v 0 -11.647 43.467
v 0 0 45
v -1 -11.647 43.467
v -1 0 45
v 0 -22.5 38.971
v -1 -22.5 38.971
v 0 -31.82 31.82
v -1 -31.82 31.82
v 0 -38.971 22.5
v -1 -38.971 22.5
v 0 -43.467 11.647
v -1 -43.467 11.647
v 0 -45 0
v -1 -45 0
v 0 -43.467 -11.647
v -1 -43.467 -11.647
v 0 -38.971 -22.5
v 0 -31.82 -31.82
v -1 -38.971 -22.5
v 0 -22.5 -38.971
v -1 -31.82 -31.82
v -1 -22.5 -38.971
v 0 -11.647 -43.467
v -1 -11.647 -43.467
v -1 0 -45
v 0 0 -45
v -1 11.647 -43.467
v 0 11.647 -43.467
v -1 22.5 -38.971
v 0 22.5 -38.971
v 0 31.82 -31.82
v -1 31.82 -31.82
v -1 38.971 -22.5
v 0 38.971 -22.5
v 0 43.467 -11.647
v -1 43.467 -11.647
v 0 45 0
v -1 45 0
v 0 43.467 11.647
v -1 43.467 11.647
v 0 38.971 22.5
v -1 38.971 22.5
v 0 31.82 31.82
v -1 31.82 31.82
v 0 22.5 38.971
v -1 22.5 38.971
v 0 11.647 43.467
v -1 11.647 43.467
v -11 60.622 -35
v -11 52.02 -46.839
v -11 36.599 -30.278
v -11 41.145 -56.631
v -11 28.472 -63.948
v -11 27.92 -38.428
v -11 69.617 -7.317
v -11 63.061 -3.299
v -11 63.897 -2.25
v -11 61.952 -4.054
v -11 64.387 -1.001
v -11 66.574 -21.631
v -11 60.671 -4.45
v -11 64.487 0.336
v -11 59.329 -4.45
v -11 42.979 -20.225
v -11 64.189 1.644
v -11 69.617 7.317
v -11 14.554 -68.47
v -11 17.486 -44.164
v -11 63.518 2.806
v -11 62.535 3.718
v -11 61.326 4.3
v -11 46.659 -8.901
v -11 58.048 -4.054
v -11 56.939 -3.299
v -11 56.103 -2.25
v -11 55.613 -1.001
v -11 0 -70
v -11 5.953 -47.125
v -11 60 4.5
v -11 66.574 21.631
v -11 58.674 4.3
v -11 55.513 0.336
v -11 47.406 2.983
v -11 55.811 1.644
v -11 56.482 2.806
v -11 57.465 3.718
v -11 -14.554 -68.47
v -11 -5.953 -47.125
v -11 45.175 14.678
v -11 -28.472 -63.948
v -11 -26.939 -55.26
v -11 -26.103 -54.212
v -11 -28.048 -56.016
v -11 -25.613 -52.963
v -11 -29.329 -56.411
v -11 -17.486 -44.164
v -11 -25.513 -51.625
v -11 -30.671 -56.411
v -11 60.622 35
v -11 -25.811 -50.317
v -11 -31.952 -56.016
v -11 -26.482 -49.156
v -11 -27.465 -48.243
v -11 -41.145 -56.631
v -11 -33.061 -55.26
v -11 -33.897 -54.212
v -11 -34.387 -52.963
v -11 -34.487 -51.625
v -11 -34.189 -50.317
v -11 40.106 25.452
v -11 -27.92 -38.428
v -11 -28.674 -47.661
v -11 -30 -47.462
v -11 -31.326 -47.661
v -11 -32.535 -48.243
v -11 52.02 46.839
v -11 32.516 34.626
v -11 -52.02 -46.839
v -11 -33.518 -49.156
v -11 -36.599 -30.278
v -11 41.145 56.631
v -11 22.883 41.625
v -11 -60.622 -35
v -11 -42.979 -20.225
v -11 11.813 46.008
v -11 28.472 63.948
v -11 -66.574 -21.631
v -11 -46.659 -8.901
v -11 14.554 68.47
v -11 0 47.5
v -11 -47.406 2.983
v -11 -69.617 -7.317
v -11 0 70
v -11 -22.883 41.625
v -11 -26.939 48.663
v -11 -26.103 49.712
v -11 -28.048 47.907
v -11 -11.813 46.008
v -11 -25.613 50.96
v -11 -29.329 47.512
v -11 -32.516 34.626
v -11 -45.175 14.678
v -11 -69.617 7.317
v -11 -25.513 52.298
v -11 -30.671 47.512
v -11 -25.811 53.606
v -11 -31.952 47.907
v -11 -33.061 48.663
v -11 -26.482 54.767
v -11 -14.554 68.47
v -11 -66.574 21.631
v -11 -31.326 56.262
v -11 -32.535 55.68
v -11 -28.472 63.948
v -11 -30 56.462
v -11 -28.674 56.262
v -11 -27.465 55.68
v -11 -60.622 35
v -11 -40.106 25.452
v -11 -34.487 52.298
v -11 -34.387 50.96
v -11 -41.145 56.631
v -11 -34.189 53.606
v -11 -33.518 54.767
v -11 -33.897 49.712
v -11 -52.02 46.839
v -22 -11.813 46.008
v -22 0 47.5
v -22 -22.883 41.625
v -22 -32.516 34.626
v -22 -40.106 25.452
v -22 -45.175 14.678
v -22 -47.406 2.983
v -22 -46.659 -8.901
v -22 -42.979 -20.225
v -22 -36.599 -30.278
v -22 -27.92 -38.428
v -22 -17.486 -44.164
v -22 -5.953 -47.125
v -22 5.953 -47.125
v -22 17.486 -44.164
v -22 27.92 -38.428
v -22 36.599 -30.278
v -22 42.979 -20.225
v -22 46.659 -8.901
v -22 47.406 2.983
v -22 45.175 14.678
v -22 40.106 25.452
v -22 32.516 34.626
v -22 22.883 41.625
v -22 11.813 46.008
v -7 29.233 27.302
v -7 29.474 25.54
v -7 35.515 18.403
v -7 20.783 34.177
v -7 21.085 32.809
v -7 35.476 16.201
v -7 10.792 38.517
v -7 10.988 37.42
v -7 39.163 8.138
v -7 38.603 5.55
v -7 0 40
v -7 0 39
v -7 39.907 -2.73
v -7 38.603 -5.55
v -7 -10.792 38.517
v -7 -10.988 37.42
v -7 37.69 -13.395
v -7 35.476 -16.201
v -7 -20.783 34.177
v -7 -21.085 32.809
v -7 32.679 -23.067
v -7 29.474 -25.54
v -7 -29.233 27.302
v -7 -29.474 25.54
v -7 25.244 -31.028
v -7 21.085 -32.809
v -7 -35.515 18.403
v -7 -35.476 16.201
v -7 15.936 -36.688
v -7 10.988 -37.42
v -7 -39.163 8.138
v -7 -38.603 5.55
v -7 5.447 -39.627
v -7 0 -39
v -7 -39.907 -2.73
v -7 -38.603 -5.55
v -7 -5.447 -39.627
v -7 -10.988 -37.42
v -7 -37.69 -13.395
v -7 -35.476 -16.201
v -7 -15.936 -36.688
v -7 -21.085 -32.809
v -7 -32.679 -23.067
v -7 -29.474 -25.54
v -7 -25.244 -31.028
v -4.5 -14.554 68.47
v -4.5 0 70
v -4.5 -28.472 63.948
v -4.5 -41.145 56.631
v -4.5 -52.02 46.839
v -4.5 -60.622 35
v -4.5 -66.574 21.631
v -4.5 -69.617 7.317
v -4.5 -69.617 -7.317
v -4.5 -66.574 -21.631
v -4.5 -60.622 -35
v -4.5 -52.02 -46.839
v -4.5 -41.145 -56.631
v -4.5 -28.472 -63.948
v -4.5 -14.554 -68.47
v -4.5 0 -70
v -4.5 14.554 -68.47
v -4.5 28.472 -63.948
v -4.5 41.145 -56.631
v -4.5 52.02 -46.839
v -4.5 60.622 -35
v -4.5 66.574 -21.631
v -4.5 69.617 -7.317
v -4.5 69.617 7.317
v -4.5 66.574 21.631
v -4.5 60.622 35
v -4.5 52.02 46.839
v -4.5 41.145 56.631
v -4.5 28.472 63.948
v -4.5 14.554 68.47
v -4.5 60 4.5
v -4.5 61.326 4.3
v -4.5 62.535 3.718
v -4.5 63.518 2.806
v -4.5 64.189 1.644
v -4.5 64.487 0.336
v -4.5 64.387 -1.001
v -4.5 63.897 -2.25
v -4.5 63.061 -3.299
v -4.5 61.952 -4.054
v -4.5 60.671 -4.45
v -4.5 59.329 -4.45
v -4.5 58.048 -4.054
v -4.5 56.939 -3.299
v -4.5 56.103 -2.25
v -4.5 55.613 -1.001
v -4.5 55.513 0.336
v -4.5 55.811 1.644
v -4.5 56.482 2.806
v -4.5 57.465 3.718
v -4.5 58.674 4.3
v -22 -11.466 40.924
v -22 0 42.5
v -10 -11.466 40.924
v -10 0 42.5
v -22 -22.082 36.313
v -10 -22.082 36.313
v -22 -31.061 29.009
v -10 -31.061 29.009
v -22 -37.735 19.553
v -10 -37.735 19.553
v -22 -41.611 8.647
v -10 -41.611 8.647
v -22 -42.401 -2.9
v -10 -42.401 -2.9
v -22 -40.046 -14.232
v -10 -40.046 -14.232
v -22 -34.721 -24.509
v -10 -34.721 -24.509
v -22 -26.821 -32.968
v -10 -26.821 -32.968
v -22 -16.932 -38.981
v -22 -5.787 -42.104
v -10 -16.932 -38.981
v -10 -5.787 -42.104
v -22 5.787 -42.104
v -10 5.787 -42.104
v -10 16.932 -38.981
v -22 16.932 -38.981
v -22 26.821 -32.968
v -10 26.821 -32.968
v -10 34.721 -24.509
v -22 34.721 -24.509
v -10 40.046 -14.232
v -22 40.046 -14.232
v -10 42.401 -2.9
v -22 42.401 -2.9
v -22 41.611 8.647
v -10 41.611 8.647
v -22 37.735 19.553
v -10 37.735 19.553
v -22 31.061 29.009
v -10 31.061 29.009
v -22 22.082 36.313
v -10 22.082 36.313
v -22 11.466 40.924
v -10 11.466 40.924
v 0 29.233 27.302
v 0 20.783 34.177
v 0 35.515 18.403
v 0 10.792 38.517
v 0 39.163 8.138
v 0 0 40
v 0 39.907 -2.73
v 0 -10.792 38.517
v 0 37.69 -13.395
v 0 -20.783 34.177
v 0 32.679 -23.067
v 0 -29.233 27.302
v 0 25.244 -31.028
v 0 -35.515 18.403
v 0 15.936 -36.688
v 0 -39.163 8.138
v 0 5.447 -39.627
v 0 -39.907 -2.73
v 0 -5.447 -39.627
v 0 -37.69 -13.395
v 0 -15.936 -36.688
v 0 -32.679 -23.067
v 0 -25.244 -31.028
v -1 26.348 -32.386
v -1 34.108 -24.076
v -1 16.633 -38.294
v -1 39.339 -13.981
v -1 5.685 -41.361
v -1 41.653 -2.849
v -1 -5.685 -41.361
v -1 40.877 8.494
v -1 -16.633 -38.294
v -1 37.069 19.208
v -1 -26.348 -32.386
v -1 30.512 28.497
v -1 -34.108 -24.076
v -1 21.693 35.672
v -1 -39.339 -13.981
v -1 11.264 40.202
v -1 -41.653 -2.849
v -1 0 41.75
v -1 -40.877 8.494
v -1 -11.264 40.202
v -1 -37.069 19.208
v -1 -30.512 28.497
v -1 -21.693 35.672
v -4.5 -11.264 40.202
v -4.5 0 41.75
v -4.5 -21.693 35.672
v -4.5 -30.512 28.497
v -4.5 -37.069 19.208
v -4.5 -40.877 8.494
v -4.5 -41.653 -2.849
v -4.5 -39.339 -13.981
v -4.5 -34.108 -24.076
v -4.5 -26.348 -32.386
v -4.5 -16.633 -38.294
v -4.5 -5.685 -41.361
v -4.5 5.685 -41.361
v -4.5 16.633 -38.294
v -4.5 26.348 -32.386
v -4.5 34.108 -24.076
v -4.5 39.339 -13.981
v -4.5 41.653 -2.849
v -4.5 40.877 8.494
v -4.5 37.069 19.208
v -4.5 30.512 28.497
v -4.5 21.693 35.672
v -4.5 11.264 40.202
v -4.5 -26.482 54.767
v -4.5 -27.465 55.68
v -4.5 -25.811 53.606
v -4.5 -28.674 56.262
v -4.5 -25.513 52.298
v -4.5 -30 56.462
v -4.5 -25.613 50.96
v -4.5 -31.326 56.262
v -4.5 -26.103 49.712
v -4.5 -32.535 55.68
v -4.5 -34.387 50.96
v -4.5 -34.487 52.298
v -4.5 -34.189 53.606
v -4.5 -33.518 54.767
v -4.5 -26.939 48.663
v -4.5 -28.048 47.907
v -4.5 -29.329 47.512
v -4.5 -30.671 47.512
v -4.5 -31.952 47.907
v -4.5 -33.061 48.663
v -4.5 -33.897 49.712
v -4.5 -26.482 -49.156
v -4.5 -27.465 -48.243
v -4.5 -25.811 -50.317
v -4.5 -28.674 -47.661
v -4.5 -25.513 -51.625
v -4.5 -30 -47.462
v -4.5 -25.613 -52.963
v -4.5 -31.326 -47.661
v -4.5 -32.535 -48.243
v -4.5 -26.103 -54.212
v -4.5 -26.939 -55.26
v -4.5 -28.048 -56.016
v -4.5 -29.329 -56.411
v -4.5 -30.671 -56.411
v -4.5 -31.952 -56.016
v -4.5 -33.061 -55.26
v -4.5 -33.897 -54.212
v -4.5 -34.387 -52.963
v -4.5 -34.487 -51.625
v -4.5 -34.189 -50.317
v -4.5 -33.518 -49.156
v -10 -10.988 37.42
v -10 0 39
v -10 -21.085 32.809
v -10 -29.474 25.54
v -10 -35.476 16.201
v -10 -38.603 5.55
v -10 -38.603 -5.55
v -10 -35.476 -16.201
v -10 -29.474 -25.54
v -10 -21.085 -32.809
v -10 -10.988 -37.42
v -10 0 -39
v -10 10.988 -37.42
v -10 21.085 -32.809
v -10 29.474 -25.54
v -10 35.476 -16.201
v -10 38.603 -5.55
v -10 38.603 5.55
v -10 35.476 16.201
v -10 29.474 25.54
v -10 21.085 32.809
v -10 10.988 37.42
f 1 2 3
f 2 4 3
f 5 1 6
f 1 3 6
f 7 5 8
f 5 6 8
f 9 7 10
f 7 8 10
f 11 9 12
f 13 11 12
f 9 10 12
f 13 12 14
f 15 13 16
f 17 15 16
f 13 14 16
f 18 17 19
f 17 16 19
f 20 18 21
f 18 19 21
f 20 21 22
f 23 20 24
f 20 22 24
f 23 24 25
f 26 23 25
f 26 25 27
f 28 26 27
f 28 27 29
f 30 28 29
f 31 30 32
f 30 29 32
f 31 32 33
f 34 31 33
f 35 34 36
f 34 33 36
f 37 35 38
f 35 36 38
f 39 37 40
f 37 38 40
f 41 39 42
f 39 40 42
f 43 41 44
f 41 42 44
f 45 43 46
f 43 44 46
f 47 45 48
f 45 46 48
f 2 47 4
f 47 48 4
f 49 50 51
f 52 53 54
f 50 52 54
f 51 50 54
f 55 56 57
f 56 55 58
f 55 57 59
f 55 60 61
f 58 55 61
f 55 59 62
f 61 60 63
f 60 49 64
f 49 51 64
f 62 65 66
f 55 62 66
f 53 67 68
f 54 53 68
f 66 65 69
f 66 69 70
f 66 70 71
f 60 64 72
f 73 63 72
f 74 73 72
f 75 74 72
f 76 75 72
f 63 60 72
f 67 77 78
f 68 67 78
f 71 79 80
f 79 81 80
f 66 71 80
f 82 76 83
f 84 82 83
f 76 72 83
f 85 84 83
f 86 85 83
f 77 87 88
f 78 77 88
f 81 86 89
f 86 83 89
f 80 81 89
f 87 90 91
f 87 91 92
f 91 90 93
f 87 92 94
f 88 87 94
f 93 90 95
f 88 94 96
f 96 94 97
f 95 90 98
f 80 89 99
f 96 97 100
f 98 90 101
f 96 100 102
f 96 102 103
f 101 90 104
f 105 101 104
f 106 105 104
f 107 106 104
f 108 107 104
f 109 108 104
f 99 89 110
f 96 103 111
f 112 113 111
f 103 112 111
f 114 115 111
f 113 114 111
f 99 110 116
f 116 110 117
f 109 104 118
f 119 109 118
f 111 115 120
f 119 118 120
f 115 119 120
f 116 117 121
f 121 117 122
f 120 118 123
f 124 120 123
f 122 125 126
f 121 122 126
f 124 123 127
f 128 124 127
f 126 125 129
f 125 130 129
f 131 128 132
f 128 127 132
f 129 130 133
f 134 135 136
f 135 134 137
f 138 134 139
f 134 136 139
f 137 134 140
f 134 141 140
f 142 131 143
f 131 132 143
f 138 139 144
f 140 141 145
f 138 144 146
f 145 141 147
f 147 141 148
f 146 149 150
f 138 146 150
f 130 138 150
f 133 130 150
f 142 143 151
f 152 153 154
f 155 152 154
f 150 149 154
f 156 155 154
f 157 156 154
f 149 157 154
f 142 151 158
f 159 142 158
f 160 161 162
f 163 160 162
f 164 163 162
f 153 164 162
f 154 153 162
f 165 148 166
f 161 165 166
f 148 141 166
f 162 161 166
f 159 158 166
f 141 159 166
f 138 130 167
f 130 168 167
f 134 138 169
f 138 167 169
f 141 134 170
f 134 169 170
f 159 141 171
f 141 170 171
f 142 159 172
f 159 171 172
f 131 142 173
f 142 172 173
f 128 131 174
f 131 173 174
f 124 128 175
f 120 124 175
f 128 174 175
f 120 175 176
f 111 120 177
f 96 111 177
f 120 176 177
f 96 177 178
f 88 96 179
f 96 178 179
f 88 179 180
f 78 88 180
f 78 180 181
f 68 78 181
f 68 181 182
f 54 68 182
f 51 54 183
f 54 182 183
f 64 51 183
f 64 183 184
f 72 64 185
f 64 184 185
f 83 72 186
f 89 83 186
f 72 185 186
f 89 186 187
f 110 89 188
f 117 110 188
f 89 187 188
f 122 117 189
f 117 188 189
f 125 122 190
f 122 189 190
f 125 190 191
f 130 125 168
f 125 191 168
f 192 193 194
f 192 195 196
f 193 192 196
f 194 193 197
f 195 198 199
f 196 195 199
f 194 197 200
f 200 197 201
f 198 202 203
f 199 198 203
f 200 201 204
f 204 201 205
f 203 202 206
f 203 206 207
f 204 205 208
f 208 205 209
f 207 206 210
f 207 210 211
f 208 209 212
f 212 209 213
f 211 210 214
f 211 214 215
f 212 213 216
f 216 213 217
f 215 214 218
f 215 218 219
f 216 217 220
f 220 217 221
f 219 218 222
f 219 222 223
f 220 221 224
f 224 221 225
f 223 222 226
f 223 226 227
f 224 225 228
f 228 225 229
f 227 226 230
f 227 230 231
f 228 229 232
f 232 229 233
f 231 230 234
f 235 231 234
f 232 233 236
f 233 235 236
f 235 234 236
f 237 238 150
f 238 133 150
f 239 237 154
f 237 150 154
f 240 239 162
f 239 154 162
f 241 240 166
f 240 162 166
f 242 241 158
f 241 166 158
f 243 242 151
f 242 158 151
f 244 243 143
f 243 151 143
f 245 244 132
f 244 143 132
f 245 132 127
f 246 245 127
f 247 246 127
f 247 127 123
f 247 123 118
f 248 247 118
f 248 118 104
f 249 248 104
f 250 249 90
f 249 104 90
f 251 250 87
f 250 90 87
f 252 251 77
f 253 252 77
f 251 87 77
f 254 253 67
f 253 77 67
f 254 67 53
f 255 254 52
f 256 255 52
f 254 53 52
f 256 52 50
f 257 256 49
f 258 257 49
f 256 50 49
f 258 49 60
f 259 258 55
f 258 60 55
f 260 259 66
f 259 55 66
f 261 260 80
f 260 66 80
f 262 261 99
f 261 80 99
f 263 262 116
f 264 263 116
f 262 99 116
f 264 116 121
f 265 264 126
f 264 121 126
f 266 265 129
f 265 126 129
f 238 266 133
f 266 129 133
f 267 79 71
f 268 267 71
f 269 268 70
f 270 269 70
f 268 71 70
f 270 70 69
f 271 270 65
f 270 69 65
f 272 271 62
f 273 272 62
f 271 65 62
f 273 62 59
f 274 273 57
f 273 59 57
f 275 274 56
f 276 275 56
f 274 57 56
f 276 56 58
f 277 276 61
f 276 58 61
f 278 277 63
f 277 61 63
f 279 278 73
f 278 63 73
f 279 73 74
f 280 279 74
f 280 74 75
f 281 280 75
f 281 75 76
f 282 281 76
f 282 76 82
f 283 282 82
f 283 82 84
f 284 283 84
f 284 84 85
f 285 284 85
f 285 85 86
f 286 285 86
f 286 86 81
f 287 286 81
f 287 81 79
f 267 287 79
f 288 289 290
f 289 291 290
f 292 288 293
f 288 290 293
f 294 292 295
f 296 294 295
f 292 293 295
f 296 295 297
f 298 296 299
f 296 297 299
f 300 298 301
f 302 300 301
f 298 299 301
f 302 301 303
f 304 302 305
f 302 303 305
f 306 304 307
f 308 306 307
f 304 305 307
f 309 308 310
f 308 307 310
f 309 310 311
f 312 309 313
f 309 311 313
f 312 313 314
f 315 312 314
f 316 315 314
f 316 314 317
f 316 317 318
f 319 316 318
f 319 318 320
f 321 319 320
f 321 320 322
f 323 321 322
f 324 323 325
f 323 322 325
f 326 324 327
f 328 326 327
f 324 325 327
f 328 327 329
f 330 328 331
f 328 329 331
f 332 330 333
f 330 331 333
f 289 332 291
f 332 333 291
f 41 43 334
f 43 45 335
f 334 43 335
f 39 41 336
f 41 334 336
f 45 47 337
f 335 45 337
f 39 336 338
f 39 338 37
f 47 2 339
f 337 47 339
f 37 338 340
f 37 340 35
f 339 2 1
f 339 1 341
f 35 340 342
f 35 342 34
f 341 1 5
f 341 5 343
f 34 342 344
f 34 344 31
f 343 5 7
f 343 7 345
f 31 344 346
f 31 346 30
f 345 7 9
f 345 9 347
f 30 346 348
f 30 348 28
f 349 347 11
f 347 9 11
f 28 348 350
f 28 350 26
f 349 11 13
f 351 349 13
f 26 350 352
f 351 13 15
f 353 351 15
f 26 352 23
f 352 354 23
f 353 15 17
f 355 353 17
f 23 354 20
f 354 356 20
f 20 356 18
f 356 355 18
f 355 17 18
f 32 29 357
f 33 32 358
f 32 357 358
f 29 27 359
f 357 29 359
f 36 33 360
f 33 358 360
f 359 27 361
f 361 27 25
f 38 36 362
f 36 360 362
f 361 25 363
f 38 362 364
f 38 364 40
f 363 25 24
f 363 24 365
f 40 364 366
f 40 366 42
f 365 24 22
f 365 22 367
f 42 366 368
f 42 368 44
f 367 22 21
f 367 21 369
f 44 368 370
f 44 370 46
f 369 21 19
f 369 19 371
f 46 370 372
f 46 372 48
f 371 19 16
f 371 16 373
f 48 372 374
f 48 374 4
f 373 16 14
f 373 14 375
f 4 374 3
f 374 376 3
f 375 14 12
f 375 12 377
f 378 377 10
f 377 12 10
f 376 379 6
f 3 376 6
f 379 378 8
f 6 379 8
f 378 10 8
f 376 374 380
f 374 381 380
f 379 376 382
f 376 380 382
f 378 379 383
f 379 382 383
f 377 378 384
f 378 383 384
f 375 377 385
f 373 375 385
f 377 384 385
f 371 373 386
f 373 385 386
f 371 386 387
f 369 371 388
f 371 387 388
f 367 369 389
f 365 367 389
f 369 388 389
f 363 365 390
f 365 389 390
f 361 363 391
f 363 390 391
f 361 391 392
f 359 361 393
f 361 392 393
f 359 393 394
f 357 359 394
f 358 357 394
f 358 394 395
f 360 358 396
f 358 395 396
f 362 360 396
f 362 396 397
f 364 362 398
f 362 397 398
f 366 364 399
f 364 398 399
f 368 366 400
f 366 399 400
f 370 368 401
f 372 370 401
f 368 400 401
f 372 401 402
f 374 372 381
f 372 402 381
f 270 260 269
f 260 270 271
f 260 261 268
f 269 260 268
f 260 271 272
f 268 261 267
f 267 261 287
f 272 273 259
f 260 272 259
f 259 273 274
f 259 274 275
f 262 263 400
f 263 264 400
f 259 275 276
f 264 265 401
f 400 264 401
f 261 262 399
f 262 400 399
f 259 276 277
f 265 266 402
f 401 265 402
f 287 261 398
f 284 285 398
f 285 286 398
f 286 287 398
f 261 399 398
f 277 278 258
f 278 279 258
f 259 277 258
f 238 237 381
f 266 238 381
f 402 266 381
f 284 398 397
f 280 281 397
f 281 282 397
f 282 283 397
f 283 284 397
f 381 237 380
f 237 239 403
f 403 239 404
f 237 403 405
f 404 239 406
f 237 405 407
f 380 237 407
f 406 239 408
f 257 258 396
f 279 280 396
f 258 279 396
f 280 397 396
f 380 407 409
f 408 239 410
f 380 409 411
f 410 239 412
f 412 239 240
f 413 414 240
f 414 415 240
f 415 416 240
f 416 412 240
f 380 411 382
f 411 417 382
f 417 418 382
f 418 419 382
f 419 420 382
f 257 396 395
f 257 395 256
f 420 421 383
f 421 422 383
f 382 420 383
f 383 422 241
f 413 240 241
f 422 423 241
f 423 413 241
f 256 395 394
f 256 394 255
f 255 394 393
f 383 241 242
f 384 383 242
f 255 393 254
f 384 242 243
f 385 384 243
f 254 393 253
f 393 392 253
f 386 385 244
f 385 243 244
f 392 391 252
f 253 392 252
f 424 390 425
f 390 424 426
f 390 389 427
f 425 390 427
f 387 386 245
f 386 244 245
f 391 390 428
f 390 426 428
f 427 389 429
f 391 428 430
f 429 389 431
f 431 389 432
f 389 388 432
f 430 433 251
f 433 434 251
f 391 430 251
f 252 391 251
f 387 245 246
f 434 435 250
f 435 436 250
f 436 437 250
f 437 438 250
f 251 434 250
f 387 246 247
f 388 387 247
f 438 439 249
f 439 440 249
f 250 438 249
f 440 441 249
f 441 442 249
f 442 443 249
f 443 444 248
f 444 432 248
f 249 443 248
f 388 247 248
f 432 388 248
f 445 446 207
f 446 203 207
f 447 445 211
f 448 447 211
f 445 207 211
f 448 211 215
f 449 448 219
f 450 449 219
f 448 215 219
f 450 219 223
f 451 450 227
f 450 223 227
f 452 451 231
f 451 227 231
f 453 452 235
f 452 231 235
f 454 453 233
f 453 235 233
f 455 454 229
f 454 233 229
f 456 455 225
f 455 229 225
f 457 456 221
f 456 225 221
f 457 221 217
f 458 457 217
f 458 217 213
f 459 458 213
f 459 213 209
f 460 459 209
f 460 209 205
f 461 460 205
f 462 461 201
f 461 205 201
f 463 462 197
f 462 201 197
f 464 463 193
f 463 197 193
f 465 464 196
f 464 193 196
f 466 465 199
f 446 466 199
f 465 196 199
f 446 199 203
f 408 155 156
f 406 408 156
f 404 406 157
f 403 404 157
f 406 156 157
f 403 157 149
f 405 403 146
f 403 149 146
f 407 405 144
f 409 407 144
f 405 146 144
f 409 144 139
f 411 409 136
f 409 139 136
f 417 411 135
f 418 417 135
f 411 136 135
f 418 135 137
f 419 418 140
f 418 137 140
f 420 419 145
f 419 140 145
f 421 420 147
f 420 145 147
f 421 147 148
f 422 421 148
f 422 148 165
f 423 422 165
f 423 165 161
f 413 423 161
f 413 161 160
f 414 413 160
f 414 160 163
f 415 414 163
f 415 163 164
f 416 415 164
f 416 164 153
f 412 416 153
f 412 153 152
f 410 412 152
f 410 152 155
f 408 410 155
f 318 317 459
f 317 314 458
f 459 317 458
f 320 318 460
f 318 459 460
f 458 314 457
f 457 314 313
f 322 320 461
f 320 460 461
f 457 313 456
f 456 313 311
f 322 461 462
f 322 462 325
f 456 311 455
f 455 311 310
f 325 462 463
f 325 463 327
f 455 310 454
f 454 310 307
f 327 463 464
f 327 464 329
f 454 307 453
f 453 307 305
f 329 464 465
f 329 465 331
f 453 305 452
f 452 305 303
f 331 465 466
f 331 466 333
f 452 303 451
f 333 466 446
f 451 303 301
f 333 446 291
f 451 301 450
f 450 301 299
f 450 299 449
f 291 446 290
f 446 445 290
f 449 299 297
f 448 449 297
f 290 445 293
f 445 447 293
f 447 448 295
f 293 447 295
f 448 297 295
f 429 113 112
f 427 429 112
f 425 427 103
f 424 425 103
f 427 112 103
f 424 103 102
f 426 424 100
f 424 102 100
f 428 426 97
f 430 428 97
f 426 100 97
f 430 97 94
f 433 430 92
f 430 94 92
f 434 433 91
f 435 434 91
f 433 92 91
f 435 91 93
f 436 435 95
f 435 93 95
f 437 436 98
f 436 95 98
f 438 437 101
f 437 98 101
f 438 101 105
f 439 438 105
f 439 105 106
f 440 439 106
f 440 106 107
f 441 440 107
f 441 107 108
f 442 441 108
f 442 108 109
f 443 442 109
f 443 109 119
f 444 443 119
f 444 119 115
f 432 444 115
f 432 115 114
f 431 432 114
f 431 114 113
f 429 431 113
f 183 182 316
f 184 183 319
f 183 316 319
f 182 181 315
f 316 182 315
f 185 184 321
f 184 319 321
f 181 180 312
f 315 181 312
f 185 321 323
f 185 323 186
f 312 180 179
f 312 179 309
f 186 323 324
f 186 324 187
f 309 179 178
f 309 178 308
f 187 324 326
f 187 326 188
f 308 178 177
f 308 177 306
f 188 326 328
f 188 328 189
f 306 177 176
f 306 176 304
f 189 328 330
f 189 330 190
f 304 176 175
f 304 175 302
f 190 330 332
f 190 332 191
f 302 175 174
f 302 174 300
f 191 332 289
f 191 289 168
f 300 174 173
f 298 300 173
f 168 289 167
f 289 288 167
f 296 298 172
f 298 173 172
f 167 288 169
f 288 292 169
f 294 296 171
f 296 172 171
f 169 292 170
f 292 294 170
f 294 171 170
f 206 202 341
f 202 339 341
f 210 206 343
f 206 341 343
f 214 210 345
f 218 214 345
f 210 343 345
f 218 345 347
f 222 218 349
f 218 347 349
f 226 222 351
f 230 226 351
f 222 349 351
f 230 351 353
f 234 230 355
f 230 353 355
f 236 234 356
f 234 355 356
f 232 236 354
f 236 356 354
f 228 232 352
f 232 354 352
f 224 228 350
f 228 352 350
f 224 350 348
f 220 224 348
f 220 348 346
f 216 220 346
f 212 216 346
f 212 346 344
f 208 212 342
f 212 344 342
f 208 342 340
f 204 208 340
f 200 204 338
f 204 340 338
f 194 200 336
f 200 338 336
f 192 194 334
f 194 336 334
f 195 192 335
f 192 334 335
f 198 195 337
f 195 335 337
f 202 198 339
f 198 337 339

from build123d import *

# Parameters (mm, degrees)
SCHIZZO2_R               = 4.5
TAGLIO_ESTRUSIONE1_DEPTH = 100.604216778


with BuildPart() as part:
    # Schizzo1 → Rivoluzione1 (revolve)
    with BuildSketch(Plane.XY, mode=Mode.PRIVATE) as rivoluzione1_sk:
        Polygon((0, 40), (0, 45), (-1, 45), (-1, 41.75), (-4.5, 41.75), (-4.5, 70), (-11, 70), (-11, 47.5), (-22, 47.5), (-22, 42.5), (-10, 42.5), (-10, 39), (-7, 39), (-7, 40), align=None)
    revolve(rivoluzione1_sk.sketch.rotate(Axis((-54.554939241, 0, 0), (1, 0, 0)), 90), axis=Axis((-54.554939241, 0, 0), (1, 0, 0)))

    # Schizzo2 → Taglio-Estrusione1 (cut, through all)
    with BuildSketch(Plane.ZY.offset(11)):
        with Locations((0, 60)):
            Circle(SCHIZZO2_R)
        with Locations((51.961524227, -30)):
            Circle(SCHIZZO2_R)
        with Locations((-51.961524227, -30)):
            Circle(SCHIZZO2_R)
    extrude(amount=-TAGLIO_ESTRUSIONE1_DEPTH, mode=Mode.SUBTRACT)


solid = part.part
